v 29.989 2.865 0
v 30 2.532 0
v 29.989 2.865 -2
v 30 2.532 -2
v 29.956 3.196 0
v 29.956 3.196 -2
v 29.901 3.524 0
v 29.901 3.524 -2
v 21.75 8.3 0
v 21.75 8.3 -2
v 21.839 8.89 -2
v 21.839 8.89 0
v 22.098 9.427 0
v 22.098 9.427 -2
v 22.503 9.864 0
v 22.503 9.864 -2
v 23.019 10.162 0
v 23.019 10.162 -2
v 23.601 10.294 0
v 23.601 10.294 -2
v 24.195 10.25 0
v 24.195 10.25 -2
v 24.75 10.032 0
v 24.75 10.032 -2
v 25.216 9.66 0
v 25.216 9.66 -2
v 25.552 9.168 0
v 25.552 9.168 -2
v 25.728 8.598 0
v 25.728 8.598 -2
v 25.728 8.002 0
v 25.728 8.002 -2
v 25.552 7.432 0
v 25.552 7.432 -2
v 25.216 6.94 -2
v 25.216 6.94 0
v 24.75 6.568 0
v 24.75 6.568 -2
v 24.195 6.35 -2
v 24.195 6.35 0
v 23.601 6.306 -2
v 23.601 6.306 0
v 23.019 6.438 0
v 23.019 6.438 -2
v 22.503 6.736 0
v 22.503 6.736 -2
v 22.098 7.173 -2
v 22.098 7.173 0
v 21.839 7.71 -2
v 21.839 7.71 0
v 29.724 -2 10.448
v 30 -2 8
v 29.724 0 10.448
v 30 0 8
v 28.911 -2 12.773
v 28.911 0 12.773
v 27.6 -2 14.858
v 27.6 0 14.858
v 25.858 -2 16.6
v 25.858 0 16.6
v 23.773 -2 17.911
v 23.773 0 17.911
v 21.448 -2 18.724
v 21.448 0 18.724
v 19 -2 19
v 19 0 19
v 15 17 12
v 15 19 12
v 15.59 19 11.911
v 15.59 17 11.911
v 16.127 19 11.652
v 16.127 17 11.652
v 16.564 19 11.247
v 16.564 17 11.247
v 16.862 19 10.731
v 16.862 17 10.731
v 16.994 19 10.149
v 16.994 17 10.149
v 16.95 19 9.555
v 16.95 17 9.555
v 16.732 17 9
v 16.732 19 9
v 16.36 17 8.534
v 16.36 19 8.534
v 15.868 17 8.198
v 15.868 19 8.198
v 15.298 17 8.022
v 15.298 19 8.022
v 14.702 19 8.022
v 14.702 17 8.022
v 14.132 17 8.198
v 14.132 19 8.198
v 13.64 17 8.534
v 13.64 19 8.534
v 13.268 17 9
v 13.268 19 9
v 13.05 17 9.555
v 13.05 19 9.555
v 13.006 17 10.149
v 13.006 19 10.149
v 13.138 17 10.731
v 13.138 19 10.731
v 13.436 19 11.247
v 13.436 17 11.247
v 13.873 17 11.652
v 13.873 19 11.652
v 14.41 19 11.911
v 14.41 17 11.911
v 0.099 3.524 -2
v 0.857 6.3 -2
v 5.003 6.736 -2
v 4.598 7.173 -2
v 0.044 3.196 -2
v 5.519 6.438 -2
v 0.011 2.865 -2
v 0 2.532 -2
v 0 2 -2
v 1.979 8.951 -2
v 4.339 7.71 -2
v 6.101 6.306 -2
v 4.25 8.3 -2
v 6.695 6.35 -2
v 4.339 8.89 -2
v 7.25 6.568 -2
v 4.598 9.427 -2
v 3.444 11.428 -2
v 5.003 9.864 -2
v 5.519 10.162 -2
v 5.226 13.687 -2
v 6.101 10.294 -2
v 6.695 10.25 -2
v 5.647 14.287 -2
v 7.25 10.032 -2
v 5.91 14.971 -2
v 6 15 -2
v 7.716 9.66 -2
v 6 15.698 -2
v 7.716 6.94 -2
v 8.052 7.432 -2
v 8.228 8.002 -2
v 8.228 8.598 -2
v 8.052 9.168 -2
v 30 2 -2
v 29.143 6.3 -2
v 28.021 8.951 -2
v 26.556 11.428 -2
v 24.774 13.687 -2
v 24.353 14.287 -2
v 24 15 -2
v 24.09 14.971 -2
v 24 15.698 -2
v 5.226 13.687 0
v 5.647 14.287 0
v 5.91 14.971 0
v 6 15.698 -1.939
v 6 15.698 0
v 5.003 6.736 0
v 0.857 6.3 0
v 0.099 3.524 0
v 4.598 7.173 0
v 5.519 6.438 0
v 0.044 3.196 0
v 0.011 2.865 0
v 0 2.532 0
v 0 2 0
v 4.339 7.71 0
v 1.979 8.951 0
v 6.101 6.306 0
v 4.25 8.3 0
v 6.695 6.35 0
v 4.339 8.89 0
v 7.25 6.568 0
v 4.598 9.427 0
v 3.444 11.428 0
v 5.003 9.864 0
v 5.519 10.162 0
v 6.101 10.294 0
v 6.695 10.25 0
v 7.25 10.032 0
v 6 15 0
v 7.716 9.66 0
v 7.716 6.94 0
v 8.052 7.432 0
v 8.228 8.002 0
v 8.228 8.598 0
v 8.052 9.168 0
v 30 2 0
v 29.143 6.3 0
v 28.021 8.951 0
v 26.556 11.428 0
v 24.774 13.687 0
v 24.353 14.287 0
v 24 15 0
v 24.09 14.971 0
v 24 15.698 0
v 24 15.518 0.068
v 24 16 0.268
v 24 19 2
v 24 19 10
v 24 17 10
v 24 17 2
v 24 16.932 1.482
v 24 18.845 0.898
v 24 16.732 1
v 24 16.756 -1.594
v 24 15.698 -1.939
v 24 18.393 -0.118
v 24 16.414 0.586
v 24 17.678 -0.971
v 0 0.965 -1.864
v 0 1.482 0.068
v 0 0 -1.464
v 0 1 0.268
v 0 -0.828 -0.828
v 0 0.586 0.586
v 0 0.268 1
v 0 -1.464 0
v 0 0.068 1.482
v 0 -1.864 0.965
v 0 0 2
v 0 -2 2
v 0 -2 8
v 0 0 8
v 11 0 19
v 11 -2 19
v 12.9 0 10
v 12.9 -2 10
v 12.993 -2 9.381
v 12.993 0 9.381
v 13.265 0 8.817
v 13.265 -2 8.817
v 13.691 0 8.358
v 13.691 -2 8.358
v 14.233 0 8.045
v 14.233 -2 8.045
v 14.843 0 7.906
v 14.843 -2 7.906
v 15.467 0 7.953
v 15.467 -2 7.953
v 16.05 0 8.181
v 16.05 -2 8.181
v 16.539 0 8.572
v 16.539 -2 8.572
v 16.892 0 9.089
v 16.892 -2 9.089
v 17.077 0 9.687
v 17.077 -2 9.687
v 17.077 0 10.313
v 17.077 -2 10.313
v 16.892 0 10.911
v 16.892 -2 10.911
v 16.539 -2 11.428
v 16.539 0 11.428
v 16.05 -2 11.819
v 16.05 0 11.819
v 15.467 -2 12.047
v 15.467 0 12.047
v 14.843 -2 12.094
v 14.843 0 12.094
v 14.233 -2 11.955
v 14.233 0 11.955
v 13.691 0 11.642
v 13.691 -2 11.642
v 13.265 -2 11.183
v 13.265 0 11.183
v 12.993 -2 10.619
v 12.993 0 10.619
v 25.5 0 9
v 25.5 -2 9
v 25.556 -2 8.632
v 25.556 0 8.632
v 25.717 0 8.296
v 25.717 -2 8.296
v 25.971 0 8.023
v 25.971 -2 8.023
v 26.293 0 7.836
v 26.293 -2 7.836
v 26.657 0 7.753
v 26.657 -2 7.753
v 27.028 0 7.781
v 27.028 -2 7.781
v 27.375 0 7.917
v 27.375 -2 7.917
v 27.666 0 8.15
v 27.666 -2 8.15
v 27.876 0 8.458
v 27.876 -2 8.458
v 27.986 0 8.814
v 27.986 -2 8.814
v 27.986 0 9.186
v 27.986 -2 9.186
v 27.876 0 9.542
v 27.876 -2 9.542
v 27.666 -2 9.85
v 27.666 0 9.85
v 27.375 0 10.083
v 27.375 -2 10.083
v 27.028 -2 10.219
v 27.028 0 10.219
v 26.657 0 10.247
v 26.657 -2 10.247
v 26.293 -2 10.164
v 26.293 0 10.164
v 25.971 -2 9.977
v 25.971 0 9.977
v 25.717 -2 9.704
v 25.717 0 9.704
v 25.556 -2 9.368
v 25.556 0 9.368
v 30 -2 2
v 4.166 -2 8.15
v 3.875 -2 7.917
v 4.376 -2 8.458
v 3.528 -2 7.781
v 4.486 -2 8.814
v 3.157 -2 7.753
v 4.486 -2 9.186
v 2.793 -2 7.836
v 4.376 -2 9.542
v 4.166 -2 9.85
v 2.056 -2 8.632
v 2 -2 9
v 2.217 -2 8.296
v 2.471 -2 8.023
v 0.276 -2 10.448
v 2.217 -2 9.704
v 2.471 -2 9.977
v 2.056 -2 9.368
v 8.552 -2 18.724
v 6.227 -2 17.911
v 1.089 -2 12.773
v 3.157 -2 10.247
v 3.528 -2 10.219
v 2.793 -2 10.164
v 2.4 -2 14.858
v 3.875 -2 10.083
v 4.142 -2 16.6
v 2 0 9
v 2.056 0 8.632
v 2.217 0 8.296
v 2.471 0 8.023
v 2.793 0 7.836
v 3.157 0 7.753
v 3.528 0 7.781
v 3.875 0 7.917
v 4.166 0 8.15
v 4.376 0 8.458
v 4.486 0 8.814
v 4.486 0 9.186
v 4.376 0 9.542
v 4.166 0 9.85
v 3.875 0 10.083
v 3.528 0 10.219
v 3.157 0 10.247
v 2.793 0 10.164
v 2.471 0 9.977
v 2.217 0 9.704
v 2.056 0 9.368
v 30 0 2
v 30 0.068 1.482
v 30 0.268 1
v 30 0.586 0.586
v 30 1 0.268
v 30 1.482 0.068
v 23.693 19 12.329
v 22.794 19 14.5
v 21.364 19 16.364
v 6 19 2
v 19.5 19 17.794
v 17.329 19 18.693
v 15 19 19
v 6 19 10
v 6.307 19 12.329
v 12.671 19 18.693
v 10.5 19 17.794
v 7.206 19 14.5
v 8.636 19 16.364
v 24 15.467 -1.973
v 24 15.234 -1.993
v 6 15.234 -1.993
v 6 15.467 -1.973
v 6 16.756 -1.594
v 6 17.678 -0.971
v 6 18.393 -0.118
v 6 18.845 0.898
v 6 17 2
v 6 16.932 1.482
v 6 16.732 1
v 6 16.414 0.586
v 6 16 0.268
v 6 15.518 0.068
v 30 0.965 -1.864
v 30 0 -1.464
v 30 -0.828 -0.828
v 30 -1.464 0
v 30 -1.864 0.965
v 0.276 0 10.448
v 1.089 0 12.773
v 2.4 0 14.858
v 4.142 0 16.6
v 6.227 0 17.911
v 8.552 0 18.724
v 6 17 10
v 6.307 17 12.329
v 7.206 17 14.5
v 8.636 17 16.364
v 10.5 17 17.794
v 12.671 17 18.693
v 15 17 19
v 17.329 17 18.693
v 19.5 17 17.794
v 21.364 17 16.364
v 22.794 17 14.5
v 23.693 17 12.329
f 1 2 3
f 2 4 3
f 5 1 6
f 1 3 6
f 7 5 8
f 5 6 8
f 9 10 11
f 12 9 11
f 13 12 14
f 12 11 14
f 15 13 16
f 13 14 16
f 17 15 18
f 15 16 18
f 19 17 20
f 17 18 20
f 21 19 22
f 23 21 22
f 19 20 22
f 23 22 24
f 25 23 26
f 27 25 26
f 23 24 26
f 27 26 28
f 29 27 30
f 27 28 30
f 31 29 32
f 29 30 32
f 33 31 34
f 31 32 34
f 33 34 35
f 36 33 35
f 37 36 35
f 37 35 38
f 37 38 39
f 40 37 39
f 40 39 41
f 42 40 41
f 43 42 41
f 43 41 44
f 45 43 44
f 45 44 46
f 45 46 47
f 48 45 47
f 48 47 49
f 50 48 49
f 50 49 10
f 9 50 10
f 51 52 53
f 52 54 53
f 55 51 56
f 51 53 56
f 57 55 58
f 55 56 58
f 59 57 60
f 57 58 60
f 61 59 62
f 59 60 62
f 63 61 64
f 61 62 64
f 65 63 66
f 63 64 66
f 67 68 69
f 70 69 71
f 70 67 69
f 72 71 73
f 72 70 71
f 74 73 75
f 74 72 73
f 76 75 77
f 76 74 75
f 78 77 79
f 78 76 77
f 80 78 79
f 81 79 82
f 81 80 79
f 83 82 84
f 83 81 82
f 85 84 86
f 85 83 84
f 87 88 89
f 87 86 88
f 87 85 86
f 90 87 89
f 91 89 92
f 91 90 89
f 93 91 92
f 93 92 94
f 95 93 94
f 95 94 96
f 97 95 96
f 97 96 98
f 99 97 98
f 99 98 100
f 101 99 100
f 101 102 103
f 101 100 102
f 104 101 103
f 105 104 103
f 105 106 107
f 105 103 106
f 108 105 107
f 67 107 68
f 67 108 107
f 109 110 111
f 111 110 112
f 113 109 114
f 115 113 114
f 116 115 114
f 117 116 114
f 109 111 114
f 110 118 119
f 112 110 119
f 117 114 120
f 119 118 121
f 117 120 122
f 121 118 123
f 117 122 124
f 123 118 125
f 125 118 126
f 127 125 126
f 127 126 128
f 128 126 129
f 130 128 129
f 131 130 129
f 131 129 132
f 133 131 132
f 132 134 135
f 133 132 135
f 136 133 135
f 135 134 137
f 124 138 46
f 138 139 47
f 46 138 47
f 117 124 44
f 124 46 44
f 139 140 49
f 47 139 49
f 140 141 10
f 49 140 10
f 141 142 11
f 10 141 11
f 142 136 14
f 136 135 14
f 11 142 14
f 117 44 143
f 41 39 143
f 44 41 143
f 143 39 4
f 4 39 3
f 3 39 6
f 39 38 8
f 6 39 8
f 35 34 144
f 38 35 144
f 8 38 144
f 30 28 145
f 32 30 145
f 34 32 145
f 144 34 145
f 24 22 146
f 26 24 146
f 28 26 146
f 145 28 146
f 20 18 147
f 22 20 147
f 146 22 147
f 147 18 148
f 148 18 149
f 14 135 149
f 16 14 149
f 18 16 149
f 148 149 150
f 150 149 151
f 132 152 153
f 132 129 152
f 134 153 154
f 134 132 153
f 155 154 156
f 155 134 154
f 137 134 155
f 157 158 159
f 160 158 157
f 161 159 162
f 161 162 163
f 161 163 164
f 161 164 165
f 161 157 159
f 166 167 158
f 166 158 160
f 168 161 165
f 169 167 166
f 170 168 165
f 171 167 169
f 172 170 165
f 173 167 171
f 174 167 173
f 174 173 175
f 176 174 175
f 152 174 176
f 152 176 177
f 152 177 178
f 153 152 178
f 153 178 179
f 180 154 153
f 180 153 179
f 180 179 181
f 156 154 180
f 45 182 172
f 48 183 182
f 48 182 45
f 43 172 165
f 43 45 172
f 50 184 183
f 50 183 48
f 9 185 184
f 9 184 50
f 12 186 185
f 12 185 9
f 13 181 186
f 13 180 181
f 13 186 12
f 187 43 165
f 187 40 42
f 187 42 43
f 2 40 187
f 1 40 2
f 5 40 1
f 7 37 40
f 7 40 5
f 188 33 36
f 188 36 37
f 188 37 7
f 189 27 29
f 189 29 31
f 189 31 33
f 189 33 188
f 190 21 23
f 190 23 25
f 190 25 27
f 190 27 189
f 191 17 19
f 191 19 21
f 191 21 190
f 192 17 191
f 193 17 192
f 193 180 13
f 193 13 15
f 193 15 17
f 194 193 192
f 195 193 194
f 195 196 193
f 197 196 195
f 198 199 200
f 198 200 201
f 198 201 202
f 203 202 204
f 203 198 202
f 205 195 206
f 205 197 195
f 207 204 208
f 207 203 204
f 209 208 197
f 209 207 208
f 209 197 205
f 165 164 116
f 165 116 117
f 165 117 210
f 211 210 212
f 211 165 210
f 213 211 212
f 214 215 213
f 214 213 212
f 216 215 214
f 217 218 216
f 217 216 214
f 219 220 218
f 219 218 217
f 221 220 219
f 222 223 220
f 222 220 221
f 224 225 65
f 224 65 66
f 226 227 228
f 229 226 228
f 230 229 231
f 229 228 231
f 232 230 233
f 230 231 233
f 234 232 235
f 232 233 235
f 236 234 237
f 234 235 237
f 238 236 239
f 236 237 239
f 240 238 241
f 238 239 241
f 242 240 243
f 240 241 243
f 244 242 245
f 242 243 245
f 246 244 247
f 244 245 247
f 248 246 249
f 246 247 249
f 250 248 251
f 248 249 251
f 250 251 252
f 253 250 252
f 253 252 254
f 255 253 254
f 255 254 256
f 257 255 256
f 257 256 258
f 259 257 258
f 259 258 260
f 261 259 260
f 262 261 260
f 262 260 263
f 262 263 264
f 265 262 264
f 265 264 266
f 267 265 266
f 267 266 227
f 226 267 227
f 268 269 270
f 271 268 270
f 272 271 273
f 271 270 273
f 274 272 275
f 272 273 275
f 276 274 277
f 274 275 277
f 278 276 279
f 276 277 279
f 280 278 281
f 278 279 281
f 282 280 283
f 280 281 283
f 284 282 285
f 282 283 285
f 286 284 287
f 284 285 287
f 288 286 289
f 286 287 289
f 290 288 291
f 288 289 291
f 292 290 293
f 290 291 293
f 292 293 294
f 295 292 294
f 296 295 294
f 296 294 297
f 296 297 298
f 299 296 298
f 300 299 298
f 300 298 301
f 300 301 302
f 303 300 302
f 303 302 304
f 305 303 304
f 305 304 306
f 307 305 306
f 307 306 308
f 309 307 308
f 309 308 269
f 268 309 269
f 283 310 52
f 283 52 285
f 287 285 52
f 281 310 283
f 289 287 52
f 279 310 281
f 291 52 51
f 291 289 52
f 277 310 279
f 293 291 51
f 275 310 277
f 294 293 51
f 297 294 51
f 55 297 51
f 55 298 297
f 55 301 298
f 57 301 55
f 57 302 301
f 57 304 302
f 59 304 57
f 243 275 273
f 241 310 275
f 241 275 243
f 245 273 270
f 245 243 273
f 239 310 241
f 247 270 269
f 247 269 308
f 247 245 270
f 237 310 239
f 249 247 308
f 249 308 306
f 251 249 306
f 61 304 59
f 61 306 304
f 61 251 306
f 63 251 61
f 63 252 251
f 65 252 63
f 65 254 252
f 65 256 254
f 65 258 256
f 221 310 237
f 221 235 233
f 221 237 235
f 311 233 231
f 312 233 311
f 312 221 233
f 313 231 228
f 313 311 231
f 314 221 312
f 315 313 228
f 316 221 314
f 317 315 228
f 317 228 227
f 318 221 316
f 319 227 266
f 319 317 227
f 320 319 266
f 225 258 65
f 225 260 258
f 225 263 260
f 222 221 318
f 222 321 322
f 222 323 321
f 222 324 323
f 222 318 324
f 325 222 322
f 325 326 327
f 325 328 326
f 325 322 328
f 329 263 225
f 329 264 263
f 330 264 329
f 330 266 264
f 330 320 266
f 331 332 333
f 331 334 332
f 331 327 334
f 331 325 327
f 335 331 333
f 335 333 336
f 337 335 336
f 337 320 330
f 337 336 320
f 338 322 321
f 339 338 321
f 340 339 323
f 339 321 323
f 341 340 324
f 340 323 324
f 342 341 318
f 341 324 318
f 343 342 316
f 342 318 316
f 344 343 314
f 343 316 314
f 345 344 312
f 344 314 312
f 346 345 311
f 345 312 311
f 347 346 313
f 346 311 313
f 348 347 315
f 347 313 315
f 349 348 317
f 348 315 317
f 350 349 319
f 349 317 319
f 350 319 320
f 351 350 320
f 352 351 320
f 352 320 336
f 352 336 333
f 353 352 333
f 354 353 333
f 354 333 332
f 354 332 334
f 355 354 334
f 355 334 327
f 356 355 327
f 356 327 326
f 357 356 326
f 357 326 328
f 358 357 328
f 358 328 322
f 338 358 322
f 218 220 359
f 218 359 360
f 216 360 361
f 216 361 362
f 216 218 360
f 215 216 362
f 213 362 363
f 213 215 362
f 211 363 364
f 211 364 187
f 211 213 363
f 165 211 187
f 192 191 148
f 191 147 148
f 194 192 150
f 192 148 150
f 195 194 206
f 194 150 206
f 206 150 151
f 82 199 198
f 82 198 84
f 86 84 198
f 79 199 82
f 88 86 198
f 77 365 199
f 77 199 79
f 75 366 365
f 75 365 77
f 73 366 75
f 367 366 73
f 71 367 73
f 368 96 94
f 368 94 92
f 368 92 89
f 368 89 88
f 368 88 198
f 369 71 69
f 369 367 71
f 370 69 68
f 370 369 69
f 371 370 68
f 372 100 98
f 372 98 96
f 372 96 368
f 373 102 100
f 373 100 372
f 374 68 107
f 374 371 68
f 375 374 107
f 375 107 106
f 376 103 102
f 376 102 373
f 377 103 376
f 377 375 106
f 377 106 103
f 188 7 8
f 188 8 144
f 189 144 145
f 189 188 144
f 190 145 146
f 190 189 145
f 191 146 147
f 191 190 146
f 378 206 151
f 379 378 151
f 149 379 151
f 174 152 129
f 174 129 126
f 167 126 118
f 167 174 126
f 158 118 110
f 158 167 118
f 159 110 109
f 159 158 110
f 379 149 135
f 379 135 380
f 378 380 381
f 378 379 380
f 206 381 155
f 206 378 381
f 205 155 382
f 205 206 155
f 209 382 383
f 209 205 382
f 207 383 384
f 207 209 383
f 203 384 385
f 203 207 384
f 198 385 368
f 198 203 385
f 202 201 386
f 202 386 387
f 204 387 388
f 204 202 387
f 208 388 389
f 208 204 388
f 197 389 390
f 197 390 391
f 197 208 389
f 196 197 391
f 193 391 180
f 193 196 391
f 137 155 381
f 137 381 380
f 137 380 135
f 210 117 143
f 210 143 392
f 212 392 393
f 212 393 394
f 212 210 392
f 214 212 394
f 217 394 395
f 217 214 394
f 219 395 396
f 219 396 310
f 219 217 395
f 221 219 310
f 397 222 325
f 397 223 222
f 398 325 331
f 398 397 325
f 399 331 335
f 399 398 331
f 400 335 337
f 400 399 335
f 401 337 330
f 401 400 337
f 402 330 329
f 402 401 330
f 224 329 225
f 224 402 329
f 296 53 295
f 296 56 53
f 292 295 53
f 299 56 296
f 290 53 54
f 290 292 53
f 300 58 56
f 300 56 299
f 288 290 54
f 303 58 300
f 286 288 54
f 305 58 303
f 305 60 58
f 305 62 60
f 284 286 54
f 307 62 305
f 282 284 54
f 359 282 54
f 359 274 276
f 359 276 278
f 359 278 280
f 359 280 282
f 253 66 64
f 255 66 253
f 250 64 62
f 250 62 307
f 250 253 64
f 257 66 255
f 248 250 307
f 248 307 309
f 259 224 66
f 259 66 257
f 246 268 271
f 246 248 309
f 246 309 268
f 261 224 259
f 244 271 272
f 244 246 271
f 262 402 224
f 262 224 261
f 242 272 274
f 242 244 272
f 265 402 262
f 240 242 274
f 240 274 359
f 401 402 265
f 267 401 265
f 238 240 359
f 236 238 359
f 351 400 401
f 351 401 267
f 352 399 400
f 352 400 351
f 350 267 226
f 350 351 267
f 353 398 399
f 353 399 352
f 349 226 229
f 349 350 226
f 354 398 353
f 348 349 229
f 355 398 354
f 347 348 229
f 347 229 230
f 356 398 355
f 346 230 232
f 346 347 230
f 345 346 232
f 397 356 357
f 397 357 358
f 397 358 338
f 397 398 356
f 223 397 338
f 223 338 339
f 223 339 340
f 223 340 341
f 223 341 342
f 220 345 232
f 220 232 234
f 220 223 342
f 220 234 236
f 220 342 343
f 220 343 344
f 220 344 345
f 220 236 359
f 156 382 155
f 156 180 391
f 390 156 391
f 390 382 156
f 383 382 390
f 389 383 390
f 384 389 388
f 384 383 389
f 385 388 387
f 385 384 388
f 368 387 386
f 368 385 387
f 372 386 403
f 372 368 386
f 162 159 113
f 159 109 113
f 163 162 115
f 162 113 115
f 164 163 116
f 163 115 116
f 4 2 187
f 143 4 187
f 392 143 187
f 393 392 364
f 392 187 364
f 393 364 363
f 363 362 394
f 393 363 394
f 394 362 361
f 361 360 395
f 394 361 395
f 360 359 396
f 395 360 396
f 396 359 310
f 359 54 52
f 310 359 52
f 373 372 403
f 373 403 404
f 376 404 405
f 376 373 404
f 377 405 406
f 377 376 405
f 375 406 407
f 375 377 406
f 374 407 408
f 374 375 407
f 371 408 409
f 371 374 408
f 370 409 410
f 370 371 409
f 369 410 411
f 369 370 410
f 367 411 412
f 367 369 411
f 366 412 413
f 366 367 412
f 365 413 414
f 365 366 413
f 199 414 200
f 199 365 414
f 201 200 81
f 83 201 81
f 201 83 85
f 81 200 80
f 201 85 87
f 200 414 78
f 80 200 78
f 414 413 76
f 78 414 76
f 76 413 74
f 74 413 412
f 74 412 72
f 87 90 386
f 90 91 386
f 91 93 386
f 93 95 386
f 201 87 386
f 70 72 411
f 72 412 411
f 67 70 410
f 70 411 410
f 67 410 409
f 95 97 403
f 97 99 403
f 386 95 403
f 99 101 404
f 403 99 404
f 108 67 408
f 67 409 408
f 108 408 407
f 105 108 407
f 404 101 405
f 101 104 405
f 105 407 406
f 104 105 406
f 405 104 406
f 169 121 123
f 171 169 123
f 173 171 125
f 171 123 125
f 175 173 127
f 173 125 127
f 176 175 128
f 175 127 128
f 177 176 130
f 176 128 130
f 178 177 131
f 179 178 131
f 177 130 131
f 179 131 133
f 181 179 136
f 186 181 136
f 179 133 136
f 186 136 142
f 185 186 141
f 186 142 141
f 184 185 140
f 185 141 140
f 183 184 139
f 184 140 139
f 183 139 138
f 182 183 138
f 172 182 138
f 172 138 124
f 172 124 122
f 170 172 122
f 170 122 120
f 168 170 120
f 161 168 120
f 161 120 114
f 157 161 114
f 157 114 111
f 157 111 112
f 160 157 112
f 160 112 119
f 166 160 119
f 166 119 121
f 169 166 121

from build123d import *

# Parameters (mm, degrees)
BRIDA_BASE1_DEPTH                = 2
REDONDEO5MM_R                    = 5
REDONDEO3MM_R                    = 3
BRIDA_DE_ARISTA1_STRIP_W         = 12
BRIDA_DE_ARISTA1_STRIP_H         = 2
BRIDA_DE_ARISTA1_STRIP_CUT_DEPTH = 30
BRIDA_DE_ARISTA1_DEPTH           = 30
BRIDA_DE_ARISTA2_STRIP_W         = 12
BRIDA_DE_ARISTA2_STRIP_H         = 2
BRIDA_DE_ARISTA2_STRIP_CUT_DEPTH = 18
BRIDA_DE_ARISTA2_DEPTH           = 18
BRIDA_START                      = 2
BRIDA_DE_ARISTA2_FLAT_DEPTH      = 2
CORTAR_EXTRUIR6_REACH            = 43.255
CROQUIS26_R                      = 2
REDONDEO11MM_R                   = 11
TALADRO_ROSCADO_M32_D            = 2.5
TALADRO_ROSCADO_M32_DEPTH        = 20.65
TALADRO_ROSCADO_M32_TIP          = 0.751075774
TALADRO_ROSCADO_M52_D            = 4.2
TALADRO_ROSCADO_M52_DEPTH        = 2
CORTAR_EXTRUIR7_REACH            = 42.274
CROQUIS36_R                      = 2


# Sheet-metal steps are written as plain solids
with BuildPart() as part:
    # Croquis1 → Brida base1 (new body)
    with BuildSketch(Plane.XY):
        with BuildLine():
            Line((0, 0), (30, 0))
            Line((30, 0), (30, 3))
            ThreePointArc((30, 3), (27.886584846, 9.212566007), (24, 14.5))
            Line((24, 14.5), (24, 17))
            Line((24, 17), (6, 17))
            Line((6, 17), (6, 14.5))
            ThreePointArc((6, 14.5), (2.113415154, 9.212566007), (0, 3))
            Line((0, 3), (0, 0))
        make_face()
    extrude(amount=-BRIDA_BASE1_DEPTH)

    # Redondeo5mm
    redondeo5mm_edges = [part.edges().sort_by_distance(p)[0] for p in [
        (0, 3, -1),
        (30, 3, -1),
    ]]
    fillet(redondeo5mm_edges, radius=REDONDEO5MM_R)

    # Redondeo3mm
    redondeo3mm_edges = [part.edges().sort_by_distance(p)[0] for p in [
        (6, 14.5, -1),
        (24, 14.5, -1),
    ]]
    fillet(redondeo3mm_edges, radius=REDONDEO3MM_R)

    # Brida de arista1 strip (across the edge) → Brida de arista1 strip cut (cut)
    with BuildSketch(Plane.YZ):
        with Locations((-4, -1)):
            Rectangle(BRIDA_DE_ARISTA1_STRIP_W, BRIDA_DE_ARISTA1_STRIP_H)
    extrude(amount=BRIDA_DE_ARISTA1_STRIP_CUT_DEPTH, mode=Mode.SUBTRACT)

    # Brida de arista1 section (across the edge) → Brida de arista1 (add)
    with BuildSketch(Plane.YZ):
        with BuildLine():
            Line((-2, 2), (-2, 19))
            Line((-2, 19), (0, 19))
            Line((0, 19), (0, 2))
            ThreePointArc((0, 2), (0.585786438, 0.585786438), (2, 0))
            Line((2, 0), (2, -2))
            ThreePointArc((2, -2), (-0.828427125, -0.828427125), (-2, 2))
        make_face()
    extrude(amount=BRIDA_DE_ARISTA1_DEPTH)

    # Brida de arista2 strip (across the edge) → Brida de arista2 strip cut (cut)
    with BuildSketch(Plane(origin=(24, 17, 0), x_dir=(0, -1, 0), z_dir=(-1, 0, 0))):
        with Locations((-4, -1)):
            Rectangle(BRIDA_DE_ARISTA2_STRIP_W, BRIDA_DE_ARISTA2_STRIP_H)
    extrude(amount=BRIDA_DE_ARISTA2_STRIP_CUT_DEPTH, mode=Mode.SUBTRACT)

    # Brida de arista2 bend section (across the edge) → Brida de arista2 (add)
    with BuildSketch(Plane(origin=(24, 17, 0), x_dir=(0, -1, 0), z_dir=(-1, 0, 0))):
        with BuildLine():
            Line((-2, 2), (0, 2))
            ThreePointArc((0, 2), (0.585786438, 0.585786438), (2, 0))
            Line((2, 0), (2, -2))
            ThreePointArc((2, -2), (-0.828427125, -0.828427125), (-2, 2))
        make_face()
    extrude(amount=BRIDA_DE_ARISTA2_DEPTH)

    # Brida de arista2 profile (on flange) → Brida de arista2 flat (add)
    with BuildSketch(Plane(origin=(0, 17, 0), x_dir=(-1, 0, 0), z_dir=(0, 1, 0)).offset(BRIDA_START)):
        with BuildLine():
            ThreePointArc((-6, 10), (-15, 19), (-24, 10))
            Line((-24, 10), (-24, 2))
            Line((-24, 2), (-6, 2))
            Line((-6, 2), (-6, 10))
        make_face()
    extrude(amount=-BRIDA_DE_ARISTA2_FLAT_DEPTH)

    # Croquis26 → Cortar-Extruir6 (cut, up to next)
    with BuildSketch(Plane(origin=(0, 0, -2), x_dir=(-1, 0, 0), z_dir=(0, 0, -1)), mode=Mode.PRIVATE) as cortar_extruir6_sk1:
        with Locations((-6.25, 8.3)):
            Circle(CROQUIS26_R)
    cortar_extruir6_tool1 = extrude(cortar_extruir6_sk1.sketch, amount=-CORTAR_EXTRUIR6_REACH, mode=Mode.PRIVATE) & part.part
    # Croquis26 → Cortar-Extruir6 (cut, up to next)
    with BuildSketch(Plane(origin=(0, 0, -2), x_dir=(-1, 0, 0), z_dir=(0, 0, -1)), mode=Mode.PRIVATE) as cortar_extruir6_sk2:
        with Locations((-23.75, 8.3)):
            Circle(CROQUIS26_R)
    cortar_extruir6_tool2 = extrude(cortar_extruir6_sk2.sketch, amount=-CORTAR_EXTRUIR6_REACH, mode=Mode.PRIVATE) & part.part
    add(cortar_extruir6_tool1.solids().sort_by_distance((6.25, 8.3, -2))[0], mode=Mode.SUBTRACT)
    add(cortar_extruir6_tool2.solids().sort_by_distance((23.75, 8.3, -2))[0], mode=Mode.SUBTRACT)

    # Redondeo11mm
    redondeo11mm_edges = [part.edges().sort_by_distance(p)[0] for p in [
        (0, -1, 19),
        (30, -1, 19),
    ]]
    fillet(redondeo11mm_edges, radius=REDONDEO11MM_R)

    # Taladro roscado M32
    with Locations(Plane(origin=(0, 0, 0), x_dir=(1, 0, 0), z_dir=(0, 1, 0))):
        with Locations((3.25, -9), (26.75, -9)):
            Hole(TALADRO_ROSCADO_M32_D / 2, depth=TALADRO_ROSCADO_M32_DEPTH)
            with Locations((0, 0, -(TALADRO_ROSCADO_M32_DEPTH + TALADRO_ROSCADO_M32_TIP / 2))):  # 118° drill point
                Cone(0, TALADRO_ROSCADO_M32_D / 2, TALADRO_ROSCADO_M32_TIP, mode=Mode.SUBTRACT)

    # Taladro roscado M52
    with Locations(Plane(origin=(3.715500562, 0, 2.638137214), x_dir=(1, 0, 0), z_dir=(0, 1, 0))):
        with Locations((11.284499438, -7.361862786)):
            Hole(TALADRO_ROSCADO_M52_D / 2, depth=TALADRO_ROSCADO_M52_DEPTH)

    # Croquis36 → Cortar-Extruir7 (cut, up to next)
    with BuildSketch(Plane(origin=(0, 17, 0), x_dir=(1, 0, 0), z_dir=(0, 1, 0)), mode=Mode.PRIVATE) as cortar_extruir7_sk1:
        with Locations(Location((15, -10, 0), (0, 0, 270))):
            Circle(CROQUIS36_R)
    cortar_extruir7_tool1 = extrude(cortar_extruir7_sk1.sketch, amount=CORTAR_EXTRUIR7_REACH, mode=Mode.PRIVATE) & part.part
    add(cortar_extruir7_tool1.solids().sort_by_distance((15, 17, 10))[0], mode=Mode.SUBTRACT)


solid = part.part
